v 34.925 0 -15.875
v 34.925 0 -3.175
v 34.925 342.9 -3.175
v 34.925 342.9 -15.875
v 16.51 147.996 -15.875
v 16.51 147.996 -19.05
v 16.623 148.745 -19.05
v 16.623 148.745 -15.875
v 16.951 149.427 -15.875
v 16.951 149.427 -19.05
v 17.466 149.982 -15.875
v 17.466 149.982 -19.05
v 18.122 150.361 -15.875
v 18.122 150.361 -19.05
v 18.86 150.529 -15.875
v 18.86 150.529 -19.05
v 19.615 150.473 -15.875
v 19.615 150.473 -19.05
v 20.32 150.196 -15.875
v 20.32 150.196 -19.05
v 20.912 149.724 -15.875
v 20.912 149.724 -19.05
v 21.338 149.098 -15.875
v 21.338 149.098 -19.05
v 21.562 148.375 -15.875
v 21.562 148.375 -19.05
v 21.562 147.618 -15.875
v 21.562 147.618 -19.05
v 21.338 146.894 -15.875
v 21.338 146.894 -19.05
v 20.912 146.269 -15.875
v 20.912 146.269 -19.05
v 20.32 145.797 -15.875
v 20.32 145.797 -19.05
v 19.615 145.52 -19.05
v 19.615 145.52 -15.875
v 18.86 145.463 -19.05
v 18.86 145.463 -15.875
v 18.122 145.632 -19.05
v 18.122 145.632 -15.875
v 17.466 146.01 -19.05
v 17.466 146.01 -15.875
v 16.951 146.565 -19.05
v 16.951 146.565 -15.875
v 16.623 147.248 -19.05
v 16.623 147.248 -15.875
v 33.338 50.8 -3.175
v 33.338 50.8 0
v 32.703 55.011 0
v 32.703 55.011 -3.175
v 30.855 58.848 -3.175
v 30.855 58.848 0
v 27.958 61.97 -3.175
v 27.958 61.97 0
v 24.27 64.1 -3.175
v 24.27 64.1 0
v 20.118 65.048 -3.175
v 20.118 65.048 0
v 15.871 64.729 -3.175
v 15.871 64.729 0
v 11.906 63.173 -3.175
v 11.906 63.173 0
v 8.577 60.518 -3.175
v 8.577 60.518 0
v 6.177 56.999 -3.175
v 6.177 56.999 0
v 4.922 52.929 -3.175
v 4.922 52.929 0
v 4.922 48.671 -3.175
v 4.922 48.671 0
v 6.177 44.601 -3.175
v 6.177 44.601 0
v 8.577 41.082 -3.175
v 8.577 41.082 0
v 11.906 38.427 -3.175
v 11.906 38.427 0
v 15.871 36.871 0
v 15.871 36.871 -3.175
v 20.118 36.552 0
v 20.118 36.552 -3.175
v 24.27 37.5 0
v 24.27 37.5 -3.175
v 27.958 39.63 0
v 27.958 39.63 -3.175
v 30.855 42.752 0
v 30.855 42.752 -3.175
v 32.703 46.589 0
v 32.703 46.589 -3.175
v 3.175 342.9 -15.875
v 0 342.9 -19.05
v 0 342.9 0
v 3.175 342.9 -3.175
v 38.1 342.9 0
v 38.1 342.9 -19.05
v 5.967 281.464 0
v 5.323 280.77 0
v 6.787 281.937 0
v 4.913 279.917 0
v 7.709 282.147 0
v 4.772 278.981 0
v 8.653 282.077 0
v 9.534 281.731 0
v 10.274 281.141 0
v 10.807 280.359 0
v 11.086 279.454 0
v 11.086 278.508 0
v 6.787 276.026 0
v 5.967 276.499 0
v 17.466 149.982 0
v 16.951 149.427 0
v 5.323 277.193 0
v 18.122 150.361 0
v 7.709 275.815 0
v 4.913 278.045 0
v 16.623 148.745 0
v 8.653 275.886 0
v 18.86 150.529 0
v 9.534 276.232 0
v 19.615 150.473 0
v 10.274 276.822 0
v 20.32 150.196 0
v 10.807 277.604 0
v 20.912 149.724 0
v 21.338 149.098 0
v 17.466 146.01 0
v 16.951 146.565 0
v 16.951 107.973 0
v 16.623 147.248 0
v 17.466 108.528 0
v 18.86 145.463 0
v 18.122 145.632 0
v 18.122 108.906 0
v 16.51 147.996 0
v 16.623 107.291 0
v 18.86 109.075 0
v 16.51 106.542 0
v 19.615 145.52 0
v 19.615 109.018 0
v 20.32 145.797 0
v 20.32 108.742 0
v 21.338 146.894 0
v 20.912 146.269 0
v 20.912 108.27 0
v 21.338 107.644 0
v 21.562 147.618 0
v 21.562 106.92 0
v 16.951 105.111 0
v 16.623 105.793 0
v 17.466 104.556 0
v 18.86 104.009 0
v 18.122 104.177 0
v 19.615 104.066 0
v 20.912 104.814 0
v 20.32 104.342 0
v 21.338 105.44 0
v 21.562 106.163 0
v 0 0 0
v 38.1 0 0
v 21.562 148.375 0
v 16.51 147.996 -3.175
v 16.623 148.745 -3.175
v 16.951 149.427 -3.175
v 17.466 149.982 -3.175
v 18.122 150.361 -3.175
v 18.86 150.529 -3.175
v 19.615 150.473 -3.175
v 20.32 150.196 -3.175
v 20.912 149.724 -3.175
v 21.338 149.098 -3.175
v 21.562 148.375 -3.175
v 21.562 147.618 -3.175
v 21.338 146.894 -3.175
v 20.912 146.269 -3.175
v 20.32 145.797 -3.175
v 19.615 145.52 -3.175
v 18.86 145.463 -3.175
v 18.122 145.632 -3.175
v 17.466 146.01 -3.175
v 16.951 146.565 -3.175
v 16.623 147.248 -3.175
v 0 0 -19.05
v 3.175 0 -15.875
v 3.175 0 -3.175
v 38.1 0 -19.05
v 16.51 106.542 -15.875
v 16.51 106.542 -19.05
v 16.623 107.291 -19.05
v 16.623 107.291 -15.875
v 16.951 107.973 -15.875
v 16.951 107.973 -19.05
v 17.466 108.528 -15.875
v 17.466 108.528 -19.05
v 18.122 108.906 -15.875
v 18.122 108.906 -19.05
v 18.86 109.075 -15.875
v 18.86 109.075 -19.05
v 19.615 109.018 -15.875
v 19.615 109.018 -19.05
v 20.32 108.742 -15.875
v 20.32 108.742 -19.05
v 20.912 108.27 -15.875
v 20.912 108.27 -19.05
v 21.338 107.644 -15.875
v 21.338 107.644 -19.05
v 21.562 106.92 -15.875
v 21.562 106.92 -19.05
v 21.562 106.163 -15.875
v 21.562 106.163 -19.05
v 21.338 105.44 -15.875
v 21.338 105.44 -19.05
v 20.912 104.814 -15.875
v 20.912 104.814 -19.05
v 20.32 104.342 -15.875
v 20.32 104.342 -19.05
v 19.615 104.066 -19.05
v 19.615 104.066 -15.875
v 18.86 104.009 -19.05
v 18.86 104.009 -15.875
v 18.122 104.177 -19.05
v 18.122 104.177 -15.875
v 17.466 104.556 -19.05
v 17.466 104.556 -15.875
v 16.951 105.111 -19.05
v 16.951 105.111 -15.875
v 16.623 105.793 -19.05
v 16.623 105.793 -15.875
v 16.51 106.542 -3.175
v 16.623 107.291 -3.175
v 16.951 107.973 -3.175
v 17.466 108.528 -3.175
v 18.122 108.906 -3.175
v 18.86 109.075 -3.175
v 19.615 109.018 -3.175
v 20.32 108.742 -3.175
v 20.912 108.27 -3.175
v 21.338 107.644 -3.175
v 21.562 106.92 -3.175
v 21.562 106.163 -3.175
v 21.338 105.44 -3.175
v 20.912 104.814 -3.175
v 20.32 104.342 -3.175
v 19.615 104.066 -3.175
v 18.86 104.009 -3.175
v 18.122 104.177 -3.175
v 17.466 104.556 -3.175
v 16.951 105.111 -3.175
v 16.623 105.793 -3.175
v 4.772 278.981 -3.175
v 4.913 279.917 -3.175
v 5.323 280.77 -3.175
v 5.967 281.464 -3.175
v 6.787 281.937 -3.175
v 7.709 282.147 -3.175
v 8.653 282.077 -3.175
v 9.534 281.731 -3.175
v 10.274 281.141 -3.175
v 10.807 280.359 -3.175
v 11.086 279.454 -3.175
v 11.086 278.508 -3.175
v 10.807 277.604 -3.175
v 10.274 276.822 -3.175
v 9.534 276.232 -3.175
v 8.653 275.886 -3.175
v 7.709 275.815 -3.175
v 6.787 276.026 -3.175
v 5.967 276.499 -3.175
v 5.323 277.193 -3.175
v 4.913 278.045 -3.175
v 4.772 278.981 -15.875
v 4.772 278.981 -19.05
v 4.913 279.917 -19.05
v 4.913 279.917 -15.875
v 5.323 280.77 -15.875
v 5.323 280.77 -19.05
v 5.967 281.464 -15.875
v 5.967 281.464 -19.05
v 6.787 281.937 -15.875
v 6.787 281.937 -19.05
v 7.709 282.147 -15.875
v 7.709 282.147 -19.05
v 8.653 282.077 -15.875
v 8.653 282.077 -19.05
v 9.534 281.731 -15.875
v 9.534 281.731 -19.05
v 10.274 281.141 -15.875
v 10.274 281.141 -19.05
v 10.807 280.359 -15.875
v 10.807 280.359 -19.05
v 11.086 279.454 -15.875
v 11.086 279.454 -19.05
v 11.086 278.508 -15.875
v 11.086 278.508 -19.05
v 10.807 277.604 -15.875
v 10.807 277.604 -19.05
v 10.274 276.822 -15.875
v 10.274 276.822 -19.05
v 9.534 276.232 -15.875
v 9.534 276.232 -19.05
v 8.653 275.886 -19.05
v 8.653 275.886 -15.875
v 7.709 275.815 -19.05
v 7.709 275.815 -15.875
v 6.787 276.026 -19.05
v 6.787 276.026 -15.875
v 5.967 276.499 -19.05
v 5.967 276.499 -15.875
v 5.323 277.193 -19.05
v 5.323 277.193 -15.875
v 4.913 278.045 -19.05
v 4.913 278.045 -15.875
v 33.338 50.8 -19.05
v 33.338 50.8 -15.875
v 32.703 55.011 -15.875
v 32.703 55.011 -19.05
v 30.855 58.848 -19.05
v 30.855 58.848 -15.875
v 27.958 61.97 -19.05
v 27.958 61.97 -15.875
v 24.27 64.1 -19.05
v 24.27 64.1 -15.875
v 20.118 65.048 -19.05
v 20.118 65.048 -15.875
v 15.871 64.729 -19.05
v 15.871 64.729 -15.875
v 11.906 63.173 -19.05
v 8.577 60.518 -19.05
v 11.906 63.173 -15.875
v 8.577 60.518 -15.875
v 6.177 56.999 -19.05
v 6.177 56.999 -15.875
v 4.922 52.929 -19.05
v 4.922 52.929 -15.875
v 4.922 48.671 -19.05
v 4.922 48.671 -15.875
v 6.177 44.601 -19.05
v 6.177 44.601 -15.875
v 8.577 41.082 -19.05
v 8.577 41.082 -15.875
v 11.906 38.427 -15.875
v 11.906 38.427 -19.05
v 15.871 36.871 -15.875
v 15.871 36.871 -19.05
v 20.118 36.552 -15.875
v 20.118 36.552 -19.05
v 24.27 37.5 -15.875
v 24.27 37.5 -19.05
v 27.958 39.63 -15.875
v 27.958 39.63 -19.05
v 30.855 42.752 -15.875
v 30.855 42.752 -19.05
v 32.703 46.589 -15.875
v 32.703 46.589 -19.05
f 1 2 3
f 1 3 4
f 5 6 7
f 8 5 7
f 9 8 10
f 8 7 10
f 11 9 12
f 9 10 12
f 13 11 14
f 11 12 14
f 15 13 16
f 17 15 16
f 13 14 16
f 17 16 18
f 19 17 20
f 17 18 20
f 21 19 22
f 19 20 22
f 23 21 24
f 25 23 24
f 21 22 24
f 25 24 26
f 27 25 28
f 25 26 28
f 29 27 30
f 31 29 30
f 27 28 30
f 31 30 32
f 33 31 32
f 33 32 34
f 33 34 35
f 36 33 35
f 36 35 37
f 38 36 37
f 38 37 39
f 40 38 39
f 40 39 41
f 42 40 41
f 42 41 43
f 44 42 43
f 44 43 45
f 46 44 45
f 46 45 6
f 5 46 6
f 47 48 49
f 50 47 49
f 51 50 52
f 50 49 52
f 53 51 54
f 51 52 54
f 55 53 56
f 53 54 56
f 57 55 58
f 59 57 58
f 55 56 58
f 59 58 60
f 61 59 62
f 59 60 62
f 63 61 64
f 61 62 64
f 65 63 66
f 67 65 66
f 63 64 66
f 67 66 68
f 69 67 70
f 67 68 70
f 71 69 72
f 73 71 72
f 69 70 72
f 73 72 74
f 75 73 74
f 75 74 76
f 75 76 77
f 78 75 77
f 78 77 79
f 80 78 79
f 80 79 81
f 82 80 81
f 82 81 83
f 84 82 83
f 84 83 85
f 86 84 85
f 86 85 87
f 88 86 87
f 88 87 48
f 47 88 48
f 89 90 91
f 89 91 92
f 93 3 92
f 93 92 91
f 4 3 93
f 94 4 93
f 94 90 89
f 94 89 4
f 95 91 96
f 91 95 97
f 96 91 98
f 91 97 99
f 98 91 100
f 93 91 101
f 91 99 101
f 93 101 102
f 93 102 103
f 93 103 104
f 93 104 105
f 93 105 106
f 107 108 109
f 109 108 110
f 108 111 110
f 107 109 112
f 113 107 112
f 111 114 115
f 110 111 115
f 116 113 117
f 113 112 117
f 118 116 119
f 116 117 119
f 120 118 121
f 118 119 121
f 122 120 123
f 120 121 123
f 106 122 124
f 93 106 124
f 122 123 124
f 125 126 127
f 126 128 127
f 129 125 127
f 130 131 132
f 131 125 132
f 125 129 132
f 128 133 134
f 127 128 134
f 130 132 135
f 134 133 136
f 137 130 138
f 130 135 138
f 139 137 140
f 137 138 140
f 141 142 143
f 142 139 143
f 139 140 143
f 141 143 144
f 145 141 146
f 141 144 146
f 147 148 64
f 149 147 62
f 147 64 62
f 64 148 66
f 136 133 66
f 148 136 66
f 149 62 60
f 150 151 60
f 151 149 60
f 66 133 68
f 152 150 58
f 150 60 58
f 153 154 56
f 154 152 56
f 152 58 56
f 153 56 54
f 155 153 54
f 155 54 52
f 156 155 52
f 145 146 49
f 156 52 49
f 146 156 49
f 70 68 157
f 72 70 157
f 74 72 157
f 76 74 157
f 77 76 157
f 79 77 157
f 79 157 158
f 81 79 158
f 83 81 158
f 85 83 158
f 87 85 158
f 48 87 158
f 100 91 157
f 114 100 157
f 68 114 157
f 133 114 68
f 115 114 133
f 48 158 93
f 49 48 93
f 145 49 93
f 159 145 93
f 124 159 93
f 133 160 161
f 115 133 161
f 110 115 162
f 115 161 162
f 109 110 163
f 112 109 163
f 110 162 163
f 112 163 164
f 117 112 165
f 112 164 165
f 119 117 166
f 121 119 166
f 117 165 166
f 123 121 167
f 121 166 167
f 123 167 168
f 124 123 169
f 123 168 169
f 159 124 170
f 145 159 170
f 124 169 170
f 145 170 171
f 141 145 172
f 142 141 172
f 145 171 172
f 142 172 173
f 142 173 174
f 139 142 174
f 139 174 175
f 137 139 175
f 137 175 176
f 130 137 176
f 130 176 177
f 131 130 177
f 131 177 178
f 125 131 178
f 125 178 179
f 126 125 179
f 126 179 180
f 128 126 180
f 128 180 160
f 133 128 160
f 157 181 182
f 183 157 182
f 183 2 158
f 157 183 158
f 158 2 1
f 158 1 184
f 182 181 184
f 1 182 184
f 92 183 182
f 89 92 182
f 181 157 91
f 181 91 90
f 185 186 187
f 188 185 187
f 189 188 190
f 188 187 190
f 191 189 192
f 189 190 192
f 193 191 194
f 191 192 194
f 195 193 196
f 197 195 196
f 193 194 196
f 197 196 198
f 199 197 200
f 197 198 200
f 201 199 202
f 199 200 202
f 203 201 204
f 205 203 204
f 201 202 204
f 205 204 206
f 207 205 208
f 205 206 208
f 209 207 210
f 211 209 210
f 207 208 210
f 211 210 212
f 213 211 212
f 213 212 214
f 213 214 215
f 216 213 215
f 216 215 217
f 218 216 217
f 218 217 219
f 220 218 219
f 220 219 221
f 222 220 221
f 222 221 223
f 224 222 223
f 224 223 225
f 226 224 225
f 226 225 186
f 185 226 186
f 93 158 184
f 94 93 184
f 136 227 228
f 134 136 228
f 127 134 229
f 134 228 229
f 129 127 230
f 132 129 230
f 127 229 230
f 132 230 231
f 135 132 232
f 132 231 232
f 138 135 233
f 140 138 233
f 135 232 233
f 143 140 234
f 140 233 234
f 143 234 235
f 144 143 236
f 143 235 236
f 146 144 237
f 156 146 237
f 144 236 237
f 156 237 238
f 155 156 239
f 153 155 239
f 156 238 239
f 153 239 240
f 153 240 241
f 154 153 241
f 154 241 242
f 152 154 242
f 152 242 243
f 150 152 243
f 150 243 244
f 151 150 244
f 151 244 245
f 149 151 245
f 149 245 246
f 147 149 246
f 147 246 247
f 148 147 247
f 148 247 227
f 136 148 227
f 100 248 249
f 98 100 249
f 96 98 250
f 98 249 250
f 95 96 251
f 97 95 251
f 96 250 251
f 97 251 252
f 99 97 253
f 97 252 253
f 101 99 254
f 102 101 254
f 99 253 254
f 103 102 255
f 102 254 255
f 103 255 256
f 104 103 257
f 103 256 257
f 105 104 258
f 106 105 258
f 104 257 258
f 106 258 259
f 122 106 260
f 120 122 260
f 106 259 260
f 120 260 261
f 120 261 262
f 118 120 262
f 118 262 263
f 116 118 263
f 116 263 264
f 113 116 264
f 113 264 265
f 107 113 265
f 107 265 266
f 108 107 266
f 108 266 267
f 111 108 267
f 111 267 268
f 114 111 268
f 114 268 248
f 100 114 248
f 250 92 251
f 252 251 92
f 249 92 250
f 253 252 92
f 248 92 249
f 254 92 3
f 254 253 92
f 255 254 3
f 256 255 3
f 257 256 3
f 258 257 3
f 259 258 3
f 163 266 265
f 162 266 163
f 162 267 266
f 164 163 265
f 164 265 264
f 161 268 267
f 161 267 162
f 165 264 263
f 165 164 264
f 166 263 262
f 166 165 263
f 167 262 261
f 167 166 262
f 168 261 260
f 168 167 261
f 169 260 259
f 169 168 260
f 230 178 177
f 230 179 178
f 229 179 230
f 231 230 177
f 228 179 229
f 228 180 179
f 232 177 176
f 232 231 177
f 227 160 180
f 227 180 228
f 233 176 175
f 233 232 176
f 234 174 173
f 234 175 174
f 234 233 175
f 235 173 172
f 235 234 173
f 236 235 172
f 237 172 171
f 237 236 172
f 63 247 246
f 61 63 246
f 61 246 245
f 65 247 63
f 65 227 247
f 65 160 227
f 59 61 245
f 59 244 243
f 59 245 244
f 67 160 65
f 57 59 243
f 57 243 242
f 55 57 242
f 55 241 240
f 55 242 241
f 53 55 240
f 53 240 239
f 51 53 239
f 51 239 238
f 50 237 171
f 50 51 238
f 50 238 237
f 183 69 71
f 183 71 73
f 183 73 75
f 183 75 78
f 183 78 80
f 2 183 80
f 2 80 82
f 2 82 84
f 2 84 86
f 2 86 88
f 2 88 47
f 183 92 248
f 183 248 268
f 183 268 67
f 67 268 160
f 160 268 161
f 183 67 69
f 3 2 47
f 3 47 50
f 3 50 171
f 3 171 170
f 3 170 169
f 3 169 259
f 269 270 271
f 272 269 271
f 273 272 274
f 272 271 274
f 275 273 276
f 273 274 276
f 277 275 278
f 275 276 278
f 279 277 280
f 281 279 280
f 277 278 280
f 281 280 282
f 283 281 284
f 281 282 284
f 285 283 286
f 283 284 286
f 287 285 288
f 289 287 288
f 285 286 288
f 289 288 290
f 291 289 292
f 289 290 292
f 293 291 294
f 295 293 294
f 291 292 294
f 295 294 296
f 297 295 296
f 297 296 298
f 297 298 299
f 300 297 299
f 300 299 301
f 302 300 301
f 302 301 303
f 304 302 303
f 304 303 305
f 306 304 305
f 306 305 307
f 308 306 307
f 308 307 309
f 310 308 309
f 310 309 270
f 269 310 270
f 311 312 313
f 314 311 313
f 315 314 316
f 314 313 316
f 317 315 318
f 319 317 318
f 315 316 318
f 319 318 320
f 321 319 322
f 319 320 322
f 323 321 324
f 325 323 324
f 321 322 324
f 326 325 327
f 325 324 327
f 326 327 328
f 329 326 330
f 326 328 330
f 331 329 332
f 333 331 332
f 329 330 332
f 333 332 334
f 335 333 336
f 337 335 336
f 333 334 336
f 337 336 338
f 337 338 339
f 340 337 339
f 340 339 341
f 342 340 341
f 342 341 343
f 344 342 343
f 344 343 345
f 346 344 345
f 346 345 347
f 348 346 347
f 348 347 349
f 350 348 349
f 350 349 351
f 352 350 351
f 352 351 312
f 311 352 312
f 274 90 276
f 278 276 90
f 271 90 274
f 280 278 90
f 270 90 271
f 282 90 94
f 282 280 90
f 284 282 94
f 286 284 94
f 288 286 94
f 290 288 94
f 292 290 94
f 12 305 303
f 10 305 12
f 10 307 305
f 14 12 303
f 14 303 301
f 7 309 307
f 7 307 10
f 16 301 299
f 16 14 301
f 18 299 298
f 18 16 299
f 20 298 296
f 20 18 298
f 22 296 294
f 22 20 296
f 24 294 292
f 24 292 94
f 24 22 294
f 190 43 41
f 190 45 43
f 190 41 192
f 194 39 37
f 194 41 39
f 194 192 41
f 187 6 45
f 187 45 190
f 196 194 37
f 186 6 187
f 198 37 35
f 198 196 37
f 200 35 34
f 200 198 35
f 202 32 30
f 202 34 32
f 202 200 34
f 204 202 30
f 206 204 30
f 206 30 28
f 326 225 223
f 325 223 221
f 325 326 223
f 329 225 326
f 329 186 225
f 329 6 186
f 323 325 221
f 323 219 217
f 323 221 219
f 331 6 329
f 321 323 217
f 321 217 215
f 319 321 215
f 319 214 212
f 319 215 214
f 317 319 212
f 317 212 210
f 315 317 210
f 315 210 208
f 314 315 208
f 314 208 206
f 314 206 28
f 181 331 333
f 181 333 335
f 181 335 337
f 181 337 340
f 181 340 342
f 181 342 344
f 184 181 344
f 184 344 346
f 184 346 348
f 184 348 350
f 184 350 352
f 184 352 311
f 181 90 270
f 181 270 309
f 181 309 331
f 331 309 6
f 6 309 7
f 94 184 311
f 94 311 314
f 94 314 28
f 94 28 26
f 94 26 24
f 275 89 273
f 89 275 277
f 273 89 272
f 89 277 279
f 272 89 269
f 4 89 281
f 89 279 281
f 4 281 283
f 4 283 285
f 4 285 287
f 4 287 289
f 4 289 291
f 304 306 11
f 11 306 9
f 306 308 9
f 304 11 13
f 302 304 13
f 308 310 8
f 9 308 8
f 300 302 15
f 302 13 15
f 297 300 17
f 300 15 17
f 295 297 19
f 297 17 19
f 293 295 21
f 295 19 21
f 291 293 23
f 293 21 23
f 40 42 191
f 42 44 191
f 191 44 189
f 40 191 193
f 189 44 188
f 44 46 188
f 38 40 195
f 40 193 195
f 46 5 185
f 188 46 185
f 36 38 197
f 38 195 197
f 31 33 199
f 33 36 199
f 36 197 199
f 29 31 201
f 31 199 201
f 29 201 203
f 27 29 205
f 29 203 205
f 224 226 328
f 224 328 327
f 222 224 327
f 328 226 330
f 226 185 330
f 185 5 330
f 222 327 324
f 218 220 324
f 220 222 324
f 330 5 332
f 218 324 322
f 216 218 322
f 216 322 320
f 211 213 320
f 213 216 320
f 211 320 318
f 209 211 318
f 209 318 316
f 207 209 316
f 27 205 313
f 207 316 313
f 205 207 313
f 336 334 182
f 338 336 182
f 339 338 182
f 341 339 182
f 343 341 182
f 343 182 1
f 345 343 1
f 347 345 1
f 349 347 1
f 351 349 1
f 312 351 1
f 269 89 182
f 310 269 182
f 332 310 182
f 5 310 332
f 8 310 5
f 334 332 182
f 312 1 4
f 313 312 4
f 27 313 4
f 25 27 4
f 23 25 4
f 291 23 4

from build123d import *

# Parameters (mm, degrees)
SKETCH1_W           = 38.1
SKETCH1_H           = 19.05
SKETCH1_W_2         = 31.75
SKETCH1_H_2         = 12.7
BOSS_EXTRUDE1_DEPTH = 342.9
SKETCH2_R           = 14.2875
CUT_EXTRUDE1_DEPTH  = 20.05
SKETCH3_R           = 2.54
SKETCH3_R_2         = 3.175
CUT_EXTRUDE2_DEPTH  = 20.05


with BuildPart() as part:
    # Sketch1 → Boss-Extrude1 (new body)
    with BuildSketch(Plane(origin=(0, 0, 0), x_dir=(1, 0, 0), z_dir=(0, 1, 0))):
        with Locations((19.05, 9.525)):
            Rectangle(SKETCH1_W, SKETCH1_H)
        with Locations((19.05, 9.525)):
            Rectangle(SKETCH1_W_2, SKETCH1_H_2, mode=Mode.SUBTRACT)
    extrude(amount=BOSS_EXTRUDE1_DEPTH)

    # Sketch2 → Cut-Extrude1 (cut, through all)
    with BuildSketch(Plane.XY):
        with Locations((19.05, 50.8)):
            Circle(SKETCH2_R)
    extrude(amount=-CUT_EXTRUDE1_DEPTH, mode=Mode.SUBTRACT)

    # Sketch3 → Cut-Extrude2 (cut, through all)
    with BuildSketch(Plane(origin=(0, 0, -19.05), x_dir=(-1, 0, 0), z_dir=(0, 0, -1))):
        with Locations((-19.05, 106.541886393)):
            Circle(SKETCH3_R)
        with Locations((-19.05, 147.996272786)):
            Circle(SKETCH3_R)
        with Locations((-7.946710848, 278.981271676)):
            Circle(SKETCH3_R_2)
    extrude(amount=-CUT_EXTRUDE2_DEPTH, mode=Mode.SUBTRACT)


solid = part.part
